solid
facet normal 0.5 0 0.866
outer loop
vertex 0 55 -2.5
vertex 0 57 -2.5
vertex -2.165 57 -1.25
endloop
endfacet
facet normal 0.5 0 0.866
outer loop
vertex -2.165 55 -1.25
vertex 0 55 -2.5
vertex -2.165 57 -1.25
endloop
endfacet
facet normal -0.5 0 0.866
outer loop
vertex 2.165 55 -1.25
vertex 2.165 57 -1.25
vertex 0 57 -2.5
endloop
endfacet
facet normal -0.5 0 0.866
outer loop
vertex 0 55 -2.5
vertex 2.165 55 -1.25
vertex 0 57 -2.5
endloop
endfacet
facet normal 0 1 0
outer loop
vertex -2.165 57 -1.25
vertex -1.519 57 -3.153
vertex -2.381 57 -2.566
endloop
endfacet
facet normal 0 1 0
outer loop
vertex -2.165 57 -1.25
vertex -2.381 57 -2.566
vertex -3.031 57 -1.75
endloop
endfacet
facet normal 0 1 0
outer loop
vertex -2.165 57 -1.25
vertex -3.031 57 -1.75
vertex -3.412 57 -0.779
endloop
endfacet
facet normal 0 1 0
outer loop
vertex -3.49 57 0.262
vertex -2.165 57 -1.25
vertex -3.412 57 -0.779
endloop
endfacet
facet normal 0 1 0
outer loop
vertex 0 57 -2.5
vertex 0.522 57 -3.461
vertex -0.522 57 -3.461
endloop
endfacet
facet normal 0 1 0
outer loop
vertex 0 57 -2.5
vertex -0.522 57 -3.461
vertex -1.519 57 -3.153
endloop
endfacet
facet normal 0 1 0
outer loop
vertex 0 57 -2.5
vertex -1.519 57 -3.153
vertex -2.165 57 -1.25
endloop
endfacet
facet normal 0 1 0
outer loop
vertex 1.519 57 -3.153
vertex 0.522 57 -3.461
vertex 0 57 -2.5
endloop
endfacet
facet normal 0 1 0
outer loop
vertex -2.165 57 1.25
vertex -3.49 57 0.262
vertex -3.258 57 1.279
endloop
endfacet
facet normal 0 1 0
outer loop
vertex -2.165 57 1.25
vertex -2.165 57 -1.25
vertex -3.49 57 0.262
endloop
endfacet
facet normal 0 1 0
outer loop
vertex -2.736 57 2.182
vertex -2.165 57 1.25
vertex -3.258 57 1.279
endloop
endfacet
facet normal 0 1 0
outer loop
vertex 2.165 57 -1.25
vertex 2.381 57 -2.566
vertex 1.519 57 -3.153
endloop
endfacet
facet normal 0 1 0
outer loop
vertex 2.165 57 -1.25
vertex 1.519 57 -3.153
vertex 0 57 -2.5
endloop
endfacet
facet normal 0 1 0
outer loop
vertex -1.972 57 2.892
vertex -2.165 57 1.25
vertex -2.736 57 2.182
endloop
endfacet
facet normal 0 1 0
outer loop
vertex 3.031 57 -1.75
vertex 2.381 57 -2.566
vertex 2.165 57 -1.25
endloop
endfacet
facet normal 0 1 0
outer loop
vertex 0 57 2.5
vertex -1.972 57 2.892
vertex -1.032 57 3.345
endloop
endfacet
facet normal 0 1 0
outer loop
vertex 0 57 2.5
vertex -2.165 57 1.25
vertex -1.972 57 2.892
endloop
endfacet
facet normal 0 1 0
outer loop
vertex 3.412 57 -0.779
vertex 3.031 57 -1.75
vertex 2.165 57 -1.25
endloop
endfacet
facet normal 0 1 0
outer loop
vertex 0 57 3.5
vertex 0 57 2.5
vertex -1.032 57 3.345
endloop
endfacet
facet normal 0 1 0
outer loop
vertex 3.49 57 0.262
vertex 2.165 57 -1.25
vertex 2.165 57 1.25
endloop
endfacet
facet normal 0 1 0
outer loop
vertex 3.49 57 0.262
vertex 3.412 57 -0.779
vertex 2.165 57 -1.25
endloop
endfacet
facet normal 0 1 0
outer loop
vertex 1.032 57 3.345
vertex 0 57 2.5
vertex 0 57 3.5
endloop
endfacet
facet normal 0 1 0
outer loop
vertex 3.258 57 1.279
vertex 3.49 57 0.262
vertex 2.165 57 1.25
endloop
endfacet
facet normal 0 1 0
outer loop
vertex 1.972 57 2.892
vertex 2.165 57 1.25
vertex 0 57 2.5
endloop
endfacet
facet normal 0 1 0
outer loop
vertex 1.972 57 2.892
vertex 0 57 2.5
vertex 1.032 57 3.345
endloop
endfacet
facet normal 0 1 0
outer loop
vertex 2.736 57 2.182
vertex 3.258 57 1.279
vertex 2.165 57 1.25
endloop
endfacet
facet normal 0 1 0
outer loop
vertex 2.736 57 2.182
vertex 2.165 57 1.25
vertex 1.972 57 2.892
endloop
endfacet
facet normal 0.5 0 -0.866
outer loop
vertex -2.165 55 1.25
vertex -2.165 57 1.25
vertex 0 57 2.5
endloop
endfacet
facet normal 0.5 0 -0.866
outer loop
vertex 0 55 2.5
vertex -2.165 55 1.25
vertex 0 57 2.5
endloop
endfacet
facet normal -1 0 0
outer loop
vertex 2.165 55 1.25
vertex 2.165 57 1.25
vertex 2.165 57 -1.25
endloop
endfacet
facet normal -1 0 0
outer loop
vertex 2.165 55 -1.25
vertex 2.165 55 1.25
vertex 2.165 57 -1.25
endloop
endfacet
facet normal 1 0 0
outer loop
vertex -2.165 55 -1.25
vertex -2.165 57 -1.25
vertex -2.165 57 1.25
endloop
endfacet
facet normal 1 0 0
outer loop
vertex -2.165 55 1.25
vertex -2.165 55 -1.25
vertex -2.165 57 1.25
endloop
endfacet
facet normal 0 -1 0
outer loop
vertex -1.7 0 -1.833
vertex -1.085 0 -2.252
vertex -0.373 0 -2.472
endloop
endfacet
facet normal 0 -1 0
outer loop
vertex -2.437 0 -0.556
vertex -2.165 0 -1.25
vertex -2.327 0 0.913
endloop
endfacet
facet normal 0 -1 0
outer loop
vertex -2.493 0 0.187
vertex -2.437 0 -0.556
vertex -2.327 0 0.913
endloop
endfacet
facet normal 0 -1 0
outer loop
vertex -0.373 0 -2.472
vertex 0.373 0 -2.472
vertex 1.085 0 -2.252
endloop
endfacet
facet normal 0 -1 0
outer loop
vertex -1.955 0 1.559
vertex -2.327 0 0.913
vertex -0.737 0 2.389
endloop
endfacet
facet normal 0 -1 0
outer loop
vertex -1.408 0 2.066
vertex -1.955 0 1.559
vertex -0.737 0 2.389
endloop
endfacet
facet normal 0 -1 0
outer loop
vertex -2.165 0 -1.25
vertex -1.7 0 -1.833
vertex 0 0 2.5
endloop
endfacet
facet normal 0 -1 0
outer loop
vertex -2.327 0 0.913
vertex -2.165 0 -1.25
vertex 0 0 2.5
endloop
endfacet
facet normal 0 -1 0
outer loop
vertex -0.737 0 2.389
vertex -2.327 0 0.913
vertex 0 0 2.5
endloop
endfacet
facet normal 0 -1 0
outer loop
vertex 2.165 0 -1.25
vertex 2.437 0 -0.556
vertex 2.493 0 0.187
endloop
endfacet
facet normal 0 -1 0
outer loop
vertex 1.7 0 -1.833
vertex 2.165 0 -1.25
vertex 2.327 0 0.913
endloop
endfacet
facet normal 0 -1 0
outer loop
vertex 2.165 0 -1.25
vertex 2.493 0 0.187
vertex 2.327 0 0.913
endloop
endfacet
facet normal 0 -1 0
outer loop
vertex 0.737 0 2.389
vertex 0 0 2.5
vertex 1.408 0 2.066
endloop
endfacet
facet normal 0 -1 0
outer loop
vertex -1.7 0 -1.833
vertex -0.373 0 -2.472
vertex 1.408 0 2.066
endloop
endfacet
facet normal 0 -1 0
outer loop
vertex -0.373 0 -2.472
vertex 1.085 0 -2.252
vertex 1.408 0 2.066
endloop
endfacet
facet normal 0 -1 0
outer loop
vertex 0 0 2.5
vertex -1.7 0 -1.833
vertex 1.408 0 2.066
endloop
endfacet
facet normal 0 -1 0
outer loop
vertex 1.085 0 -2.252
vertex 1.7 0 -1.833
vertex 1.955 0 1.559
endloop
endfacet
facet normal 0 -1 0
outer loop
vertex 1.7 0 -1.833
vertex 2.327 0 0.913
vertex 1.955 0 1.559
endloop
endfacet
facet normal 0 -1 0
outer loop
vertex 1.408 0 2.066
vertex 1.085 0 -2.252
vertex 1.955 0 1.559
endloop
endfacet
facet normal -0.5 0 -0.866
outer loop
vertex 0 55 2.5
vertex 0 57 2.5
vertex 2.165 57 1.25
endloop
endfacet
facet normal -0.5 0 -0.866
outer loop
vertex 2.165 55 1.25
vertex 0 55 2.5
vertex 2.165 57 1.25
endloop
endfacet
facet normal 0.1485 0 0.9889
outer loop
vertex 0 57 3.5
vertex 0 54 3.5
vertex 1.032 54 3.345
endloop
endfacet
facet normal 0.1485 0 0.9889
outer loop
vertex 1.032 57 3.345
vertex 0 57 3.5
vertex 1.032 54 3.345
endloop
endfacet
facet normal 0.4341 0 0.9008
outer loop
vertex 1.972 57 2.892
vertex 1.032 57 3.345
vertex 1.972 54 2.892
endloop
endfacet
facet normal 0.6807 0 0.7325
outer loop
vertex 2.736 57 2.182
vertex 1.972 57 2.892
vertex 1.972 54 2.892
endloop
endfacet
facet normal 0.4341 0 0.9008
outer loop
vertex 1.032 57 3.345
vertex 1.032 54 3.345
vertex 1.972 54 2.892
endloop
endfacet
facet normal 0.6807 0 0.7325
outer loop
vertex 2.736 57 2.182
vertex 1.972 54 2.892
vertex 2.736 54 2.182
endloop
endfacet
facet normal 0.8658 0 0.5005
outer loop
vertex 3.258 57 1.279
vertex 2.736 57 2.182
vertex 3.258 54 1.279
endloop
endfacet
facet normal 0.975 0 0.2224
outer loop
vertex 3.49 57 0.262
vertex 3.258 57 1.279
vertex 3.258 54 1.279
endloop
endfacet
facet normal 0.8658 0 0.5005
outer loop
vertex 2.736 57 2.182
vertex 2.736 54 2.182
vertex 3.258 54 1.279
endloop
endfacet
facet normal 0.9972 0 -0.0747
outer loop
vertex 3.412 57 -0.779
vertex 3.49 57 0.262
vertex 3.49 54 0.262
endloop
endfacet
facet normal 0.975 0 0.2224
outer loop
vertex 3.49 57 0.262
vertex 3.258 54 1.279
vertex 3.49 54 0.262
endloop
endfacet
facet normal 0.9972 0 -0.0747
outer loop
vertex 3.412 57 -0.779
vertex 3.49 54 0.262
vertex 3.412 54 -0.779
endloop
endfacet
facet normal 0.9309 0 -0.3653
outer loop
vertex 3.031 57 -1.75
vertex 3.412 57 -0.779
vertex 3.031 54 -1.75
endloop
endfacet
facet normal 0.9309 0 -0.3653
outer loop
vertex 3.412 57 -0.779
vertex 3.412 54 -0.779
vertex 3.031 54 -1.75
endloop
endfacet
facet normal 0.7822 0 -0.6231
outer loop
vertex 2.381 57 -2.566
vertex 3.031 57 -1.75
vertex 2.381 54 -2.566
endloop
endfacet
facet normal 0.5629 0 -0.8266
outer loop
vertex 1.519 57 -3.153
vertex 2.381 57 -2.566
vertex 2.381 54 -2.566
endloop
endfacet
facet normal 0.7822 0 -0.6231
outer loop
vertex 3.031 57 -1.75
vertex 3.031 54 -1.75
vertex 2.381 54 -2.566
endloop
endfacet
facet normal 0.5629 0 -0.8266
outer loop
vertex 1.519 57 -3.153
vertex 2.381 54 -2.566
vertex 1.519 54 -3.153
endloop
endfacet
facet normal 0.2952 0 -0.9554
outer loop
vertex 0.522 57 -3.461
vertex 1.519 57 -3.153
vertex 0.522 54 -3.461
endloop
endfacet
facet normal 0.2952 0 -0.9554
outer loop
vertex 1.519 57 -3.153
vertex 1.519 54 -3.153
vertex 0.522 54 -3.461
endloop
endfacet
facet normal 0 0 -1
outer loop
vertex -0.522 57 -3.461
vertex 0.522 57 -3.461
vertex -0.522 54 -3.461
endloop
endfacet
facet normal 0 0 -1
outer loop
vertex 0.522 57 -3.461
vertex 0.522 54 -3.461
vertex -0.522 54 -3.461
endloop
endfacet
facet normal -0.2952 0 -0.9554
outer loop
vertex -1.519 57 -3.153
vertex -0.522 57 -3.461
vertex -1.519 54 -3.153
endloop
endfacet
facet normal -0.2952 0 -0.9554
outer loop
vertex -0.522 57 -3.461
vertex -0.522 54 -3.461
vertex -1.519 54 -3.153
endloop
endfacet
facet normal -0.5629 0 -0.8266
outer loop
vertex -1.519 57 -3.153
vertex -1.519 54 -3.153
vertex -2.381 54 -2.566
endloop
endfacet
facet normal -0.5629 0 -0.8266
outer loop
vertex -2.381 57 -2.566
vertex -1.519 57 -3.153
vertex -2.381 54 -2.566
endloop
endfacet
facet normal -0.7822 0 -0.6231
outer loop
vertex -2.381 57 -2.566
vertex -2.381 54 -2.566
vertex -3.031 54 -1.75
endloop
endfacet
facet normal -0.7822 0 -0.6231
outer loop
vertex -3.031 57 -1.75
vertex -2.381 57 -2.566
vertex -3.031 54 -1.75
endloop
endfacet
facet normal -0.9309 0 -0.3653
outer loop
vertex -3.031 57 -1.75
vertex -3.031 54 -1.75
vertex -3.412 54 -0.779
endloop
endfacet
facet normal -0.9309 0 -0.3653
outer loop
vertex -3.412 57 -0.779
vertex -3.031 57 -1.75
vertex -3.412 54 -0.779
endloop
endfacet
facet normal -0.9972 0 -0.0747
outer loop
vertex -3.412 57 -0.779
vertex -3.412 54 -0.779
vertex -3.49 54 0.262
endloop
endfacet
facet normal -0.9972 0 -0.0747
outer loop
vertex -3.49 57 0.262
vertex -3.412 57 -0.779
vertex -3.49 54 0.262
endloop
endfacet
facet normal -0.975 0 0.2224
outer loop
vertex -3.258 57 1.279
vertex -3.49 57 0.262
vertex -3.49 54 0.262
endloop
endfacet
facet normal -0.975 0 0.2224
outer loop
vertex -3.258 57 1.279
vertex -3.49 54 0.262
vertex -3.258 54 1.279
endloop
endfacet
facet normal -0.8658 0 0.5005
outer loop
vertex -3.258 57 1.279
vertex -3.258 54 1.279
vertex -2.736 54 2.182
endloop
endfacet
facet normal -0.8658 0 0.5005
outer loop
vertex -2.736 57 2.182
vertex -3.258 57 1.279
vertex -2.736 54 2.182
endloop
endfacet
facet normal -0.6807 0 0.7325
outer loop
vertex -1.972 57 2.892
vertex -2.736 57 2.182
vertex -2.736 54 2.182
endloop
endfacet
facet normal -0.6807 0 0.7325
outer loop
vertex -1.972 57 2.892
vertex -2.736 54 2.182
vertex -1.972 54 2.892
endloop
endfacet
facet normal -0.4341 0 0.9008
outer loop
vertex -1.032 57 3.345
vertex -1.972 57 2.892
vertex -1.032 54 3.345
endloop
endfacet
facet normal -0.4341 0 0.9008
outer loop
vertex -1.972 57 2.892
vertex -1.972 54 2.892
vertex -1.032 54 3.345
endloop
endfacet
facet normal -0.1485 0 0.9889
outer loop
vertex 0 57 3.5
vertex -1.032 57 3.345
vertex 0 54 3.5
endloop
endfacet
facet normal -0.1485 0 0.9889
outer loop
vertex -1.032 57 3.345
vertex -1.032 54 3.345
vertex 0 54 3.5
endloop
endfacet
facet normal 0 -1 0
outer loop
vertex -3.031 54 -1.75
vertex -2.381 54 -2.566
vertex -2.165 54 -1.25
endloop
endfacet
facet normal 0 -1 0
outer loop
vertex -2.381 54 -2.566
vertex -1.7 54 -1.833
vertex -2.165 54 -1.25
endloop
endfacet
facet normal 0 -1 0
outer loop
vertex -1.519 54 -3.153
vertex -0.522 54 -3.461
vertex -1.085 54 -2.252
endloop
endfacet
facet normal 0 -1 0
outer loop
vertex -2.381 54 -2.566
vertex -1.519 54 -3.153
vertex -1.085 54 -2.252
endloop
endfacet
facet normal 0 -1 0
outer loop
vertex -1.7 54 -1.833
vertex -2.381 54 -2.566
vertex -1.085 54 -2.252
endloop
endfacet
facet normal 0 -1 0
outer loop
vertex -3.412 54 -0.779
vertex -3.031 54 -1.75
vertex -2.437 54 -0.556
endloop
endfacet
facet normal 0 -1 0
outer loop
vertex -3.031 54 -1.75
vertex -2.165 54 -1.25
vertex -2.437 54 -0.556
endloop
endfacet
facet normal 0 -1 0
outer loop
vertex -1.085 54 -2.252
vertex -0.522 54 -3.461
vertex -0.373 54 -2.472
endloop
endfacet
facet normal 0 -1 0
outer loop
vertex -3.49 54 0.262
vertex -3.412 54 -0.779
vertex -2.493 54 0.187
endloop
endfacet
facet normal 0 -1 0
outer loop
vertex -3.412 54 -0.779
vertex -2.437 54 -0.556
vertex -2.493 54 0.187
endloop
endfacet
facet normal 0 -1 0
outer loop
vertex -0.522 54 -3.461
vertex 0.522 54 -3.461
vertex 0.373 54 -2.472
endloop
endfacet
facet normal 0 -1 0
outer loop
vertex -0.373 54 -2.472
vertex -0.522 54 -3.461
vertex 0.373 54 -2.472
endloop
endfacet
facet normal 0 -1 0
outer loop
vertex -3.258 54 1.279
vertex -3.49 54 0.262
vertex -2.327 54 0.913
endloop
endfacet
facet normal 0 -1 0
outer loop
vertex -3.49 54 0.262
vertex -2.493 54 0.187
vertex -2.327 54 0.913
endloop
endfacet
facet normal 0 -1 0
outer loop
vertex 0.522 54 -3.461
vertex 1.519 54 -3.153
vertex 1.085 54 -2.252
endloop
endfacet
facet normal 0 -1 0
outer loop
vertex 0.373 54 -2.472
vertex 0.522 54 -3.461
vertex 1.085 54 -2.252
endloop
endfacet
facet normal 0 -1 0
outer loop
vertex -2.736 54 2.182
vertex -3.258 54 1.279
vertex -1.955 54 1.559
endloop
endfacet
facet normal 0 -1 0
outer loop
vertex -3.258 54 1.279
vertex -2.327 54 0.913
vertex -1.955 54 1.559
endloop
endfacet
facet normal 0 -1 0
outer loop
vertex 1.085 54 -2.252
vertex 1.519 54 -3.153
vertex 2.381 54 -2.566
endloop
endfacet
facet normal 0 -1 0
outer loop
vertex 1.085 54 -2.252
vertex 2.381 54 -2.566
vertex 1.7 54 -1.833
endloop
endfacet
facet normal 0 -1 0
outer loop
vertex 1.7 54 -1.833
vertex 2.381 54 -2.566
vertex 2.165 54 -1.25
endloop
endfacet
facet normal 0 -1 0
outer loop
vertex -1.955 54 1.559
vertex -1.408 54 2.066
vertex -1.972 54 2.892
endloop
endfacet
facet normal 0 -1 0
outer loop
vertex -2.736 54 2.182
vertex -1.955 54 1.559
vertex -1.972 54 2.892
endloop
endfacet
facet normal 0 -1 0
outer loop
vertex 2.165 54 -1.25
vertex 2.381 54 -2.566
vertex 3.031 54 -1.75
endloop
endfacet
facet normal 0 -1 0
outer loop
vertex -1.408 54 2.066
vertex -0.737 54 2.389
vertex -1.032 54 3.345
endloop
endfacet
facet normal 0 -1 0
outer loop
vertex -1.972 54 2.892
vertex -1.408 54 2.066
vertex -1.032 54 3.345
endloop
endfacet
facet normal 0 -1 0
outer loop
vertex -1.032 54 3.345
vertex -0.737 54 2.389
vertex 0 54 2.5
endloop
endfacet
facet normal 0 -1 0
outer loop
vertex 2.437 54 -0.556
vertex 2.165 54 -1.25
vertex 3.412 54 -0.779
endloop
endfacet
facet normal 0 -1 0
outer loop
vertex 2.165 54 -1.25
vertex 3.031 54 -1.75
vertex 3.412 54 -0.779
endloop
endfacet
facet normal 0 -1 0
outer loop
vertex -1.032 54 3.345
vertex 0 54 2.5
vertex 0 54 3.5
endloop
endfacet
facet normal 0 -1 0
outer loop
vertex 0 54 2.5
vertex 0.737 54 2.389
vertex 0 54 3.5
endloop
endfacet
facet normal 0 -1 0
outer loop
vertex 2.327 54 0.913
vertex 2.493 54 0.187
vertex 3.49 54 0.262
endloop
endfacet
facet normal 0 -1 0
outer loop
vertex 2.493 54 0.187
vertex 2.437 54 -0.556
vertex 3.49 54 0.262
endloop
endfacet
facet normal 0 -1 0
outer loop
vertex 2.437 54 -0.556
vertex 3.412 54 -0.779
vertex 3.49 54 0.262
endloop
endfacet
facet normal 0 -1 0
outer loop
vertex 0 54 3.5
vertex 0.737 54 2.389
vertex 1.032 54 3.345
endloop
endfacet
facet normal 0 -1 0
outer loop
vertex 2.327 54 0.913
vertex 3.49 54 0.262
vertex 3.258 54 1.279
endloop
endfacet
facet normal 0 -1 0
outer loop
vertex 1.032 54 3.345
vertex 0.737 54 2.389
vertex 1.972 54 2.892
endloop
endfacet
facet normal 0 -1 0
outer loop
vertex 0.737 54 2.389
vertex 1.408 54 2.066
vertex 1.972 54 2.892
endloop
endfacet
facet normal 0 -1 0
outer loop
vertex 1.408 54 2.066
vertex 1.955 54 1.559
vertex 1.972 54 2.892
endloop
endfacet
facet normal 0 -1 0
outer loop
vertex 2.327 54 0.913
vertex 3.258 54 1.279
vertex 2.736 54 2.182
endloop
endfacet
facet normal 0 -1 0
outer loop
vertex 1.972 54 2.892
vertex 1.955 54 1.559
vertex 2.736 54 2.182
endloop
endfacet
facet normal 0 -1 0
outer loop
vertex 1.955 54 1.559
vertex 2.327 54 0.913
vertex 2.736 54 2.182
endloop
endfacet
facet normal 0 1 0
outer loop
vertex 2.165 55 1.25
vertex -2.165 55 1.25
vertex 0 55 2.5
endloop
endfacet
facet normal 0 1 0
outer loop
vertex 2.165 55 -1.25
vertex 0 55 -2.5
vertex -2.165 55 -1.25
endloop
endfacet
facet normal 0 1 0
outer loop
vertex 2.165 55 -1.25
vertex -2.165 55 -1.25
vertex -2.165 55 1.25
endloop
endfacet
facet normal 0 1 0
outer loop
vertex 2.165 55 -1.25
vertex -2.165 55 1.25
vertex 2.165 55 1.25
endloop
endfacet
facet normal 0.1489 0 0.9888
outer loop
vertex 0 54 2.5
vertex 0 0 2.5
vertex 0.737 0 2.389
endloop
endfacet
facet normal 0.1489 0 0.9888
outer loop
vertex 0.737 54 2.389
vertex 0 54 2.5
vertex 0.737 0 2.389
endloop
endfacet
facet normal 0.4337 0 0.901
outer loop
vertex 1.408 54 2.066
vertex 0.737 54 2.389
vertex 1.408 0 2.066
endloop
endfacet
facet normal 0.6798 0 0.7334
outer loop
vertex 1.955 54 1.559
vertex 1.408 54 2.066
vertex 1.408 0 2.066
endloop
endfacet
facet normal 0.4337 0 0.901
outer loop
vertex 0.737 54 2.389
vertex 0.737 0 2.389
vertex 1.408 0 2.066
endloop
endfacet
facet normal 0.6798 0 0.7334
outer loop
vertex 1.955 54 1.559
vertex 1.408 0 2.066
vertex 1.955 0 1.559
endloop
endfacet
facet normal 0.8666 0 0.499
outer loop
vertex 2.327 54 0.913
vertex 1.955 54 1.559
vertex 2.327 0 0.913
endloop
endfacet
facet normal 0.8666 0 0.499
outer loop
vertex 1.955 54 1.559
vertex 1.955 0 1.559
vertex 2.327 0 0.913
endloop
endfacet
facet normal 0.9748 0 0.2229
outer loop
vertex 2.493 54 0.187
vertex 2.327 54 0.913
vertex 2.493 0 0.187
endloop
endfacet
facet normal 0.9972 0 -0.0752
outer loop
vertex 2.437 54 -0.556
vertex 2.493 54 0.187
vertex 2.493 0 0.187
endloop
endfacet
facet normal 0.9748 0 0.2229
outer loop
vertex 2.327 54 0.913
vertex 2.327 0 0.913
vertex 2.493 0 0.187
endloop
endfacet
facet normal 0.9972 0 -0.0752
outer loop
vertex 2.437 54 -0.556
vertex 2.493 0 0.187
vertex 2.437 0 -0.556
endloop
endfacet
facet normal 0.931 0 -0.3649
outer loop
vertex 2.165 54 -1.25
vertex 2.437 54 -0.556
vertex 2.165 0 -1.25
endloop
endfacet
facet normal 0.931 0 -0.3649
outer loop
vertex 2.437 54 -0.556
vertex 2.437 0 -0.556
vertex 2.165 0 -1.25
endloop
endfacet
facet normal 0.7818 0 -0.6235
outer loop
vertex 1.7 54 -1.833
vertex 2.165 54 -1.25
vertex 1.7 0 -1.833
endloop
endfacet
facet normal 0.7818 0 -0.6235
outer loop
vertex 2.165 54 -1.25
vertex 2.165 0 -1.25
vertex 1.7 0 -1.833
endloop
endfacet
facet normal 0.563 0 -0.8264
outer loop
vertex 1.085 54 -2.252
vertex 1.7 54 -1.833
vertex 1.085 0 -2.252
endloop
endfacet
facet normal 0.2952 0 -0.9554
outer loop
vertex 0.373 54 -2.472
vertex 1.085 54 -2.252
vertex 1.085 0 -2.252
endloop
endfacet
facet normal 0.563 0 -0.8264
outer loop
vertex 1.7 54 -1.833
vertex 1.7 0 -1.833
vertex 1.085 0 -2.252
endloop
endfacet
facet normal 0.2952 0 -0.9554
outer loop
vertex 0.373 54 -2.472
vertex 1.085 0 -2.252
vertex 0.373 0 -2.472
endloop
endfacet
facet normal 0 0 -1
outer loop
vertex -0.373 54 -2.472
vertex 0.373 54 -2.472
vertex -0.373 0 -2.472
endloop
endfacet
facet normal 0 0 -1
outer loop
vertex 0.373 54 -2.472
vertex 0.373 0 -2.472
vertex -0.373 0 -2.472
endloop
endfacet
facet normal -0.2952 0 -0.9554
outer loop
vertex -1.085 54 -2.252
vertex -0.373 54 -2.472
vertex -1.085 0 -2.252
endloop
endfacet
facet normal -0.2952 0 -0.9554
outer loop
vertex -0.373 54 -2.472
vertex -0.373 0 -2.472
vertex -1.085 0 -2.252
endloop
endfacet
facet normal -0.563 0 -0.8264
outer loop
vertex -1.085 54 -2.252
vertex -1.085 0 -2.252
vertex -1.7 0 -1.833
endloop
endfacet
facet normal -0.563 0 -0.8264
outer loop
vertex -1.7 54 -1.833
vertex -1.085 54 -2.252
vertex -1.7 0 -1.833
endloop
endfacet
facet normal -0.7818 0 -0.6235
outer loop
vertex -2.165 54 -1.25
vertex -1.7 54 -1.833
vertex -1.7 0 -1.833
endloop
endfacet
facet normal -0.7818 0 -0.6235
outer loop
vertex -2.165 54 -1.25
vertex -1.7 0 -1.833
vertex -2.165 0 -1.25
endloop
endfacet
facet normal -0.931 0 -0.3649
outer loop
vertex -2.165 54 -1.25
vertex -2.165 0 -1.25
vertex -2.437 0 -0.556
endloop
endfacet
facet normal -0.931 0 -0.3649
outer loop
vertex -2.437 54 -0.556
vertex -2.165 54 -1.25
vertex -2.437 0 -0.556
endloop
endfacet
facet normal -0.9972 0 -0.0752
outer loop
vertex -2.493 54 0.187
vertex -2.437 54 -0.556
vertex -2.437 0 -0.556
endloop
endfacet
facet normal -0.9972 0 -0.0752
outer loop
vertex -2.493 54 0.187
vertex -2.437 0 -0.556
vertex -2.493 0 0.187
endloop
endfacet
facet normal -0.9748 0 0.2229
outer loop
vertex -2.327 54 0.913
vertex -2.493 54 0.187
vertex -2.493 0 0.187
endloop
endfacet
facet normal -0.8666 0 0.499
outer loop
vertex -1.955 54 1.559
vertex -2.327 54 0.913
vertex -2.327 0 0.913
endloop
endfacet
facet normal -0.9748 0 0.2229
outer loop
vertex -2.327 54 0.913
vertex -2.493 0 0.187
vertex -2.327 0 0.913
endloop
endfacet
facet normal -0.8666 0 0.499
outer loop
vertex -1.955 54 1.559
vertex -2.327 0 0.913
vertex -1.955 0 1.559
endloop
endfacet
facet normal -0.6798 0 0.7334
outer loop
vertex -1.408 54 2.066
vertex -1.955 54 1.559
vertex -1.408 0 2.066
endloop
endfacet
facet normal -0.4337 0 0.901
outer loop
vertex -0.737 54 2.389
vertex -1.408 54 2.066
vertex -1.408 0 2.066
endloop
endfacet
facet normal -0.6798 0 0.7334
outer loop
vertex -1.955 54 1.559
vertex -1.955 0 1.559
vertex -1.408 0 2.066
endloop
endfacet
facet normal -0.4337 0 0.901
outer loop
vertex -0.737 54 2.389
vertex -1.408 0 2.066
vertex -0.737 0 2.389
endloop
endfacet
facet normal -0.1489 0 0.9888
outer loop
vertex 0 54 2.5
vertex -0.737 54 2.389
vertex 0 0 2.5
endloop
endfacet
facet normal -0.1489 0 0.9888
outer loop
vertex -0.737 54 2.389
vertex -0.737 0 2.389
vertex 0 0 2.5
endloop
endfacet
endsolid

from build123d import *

# Parameters (mm, degrees)
SKETCH1_R          = 2.5
SCREW_LENGTH_DEPTH = 54
SKETCH2_R          = 3.5
SCREW_CAP_DEPTH    = 3
SCREW_HOLE_DEPTH   = 2


with BuildPart() as part:
    # Sketch1 → Screw Length (new body)
    with BuildSketch(Plane(origin=(0, 0, 0), x_dir=(1, 0, 0), z_dir=(0, 1, 0))):
        with Locations(Location((0, 0, 0), (0, 0, 270))):
            Circle(SKETCH1_R)
    extrude(amount=SCREW_LENGTH_DEPTH)

    # Sketch2 → Screw Cap (add)
    with BuildSketch(Plane(origin=(0, 54, 0), x_dir=(1, 0, 0), z_dir=(0, 1, 0))):
        with Locations(Location((0, 0, 0), (0, 0, 270))):
            Circle(SKETCH2_R)
    extrude(amount=SCREW_CAP_DEPTH)

    # Sketch3 → Screw Hole (cut)
    with BuildSketch(Plane(origin=(0, 57, 0), x_dir=(1, 0, 0), z_dir=(0, 1, 0))):
        Polygon((0, 2.5), (-2.165063509, 1.25), (-2.165063509, -1.25), (0, -2.5), (2.165063509, -1.25), (2.165063509, 1.25), align=None)
    extrude(amount=-SCREW_HOLE_DEPTH, mode=Mode.SUBTRACT)


solid = part.part
